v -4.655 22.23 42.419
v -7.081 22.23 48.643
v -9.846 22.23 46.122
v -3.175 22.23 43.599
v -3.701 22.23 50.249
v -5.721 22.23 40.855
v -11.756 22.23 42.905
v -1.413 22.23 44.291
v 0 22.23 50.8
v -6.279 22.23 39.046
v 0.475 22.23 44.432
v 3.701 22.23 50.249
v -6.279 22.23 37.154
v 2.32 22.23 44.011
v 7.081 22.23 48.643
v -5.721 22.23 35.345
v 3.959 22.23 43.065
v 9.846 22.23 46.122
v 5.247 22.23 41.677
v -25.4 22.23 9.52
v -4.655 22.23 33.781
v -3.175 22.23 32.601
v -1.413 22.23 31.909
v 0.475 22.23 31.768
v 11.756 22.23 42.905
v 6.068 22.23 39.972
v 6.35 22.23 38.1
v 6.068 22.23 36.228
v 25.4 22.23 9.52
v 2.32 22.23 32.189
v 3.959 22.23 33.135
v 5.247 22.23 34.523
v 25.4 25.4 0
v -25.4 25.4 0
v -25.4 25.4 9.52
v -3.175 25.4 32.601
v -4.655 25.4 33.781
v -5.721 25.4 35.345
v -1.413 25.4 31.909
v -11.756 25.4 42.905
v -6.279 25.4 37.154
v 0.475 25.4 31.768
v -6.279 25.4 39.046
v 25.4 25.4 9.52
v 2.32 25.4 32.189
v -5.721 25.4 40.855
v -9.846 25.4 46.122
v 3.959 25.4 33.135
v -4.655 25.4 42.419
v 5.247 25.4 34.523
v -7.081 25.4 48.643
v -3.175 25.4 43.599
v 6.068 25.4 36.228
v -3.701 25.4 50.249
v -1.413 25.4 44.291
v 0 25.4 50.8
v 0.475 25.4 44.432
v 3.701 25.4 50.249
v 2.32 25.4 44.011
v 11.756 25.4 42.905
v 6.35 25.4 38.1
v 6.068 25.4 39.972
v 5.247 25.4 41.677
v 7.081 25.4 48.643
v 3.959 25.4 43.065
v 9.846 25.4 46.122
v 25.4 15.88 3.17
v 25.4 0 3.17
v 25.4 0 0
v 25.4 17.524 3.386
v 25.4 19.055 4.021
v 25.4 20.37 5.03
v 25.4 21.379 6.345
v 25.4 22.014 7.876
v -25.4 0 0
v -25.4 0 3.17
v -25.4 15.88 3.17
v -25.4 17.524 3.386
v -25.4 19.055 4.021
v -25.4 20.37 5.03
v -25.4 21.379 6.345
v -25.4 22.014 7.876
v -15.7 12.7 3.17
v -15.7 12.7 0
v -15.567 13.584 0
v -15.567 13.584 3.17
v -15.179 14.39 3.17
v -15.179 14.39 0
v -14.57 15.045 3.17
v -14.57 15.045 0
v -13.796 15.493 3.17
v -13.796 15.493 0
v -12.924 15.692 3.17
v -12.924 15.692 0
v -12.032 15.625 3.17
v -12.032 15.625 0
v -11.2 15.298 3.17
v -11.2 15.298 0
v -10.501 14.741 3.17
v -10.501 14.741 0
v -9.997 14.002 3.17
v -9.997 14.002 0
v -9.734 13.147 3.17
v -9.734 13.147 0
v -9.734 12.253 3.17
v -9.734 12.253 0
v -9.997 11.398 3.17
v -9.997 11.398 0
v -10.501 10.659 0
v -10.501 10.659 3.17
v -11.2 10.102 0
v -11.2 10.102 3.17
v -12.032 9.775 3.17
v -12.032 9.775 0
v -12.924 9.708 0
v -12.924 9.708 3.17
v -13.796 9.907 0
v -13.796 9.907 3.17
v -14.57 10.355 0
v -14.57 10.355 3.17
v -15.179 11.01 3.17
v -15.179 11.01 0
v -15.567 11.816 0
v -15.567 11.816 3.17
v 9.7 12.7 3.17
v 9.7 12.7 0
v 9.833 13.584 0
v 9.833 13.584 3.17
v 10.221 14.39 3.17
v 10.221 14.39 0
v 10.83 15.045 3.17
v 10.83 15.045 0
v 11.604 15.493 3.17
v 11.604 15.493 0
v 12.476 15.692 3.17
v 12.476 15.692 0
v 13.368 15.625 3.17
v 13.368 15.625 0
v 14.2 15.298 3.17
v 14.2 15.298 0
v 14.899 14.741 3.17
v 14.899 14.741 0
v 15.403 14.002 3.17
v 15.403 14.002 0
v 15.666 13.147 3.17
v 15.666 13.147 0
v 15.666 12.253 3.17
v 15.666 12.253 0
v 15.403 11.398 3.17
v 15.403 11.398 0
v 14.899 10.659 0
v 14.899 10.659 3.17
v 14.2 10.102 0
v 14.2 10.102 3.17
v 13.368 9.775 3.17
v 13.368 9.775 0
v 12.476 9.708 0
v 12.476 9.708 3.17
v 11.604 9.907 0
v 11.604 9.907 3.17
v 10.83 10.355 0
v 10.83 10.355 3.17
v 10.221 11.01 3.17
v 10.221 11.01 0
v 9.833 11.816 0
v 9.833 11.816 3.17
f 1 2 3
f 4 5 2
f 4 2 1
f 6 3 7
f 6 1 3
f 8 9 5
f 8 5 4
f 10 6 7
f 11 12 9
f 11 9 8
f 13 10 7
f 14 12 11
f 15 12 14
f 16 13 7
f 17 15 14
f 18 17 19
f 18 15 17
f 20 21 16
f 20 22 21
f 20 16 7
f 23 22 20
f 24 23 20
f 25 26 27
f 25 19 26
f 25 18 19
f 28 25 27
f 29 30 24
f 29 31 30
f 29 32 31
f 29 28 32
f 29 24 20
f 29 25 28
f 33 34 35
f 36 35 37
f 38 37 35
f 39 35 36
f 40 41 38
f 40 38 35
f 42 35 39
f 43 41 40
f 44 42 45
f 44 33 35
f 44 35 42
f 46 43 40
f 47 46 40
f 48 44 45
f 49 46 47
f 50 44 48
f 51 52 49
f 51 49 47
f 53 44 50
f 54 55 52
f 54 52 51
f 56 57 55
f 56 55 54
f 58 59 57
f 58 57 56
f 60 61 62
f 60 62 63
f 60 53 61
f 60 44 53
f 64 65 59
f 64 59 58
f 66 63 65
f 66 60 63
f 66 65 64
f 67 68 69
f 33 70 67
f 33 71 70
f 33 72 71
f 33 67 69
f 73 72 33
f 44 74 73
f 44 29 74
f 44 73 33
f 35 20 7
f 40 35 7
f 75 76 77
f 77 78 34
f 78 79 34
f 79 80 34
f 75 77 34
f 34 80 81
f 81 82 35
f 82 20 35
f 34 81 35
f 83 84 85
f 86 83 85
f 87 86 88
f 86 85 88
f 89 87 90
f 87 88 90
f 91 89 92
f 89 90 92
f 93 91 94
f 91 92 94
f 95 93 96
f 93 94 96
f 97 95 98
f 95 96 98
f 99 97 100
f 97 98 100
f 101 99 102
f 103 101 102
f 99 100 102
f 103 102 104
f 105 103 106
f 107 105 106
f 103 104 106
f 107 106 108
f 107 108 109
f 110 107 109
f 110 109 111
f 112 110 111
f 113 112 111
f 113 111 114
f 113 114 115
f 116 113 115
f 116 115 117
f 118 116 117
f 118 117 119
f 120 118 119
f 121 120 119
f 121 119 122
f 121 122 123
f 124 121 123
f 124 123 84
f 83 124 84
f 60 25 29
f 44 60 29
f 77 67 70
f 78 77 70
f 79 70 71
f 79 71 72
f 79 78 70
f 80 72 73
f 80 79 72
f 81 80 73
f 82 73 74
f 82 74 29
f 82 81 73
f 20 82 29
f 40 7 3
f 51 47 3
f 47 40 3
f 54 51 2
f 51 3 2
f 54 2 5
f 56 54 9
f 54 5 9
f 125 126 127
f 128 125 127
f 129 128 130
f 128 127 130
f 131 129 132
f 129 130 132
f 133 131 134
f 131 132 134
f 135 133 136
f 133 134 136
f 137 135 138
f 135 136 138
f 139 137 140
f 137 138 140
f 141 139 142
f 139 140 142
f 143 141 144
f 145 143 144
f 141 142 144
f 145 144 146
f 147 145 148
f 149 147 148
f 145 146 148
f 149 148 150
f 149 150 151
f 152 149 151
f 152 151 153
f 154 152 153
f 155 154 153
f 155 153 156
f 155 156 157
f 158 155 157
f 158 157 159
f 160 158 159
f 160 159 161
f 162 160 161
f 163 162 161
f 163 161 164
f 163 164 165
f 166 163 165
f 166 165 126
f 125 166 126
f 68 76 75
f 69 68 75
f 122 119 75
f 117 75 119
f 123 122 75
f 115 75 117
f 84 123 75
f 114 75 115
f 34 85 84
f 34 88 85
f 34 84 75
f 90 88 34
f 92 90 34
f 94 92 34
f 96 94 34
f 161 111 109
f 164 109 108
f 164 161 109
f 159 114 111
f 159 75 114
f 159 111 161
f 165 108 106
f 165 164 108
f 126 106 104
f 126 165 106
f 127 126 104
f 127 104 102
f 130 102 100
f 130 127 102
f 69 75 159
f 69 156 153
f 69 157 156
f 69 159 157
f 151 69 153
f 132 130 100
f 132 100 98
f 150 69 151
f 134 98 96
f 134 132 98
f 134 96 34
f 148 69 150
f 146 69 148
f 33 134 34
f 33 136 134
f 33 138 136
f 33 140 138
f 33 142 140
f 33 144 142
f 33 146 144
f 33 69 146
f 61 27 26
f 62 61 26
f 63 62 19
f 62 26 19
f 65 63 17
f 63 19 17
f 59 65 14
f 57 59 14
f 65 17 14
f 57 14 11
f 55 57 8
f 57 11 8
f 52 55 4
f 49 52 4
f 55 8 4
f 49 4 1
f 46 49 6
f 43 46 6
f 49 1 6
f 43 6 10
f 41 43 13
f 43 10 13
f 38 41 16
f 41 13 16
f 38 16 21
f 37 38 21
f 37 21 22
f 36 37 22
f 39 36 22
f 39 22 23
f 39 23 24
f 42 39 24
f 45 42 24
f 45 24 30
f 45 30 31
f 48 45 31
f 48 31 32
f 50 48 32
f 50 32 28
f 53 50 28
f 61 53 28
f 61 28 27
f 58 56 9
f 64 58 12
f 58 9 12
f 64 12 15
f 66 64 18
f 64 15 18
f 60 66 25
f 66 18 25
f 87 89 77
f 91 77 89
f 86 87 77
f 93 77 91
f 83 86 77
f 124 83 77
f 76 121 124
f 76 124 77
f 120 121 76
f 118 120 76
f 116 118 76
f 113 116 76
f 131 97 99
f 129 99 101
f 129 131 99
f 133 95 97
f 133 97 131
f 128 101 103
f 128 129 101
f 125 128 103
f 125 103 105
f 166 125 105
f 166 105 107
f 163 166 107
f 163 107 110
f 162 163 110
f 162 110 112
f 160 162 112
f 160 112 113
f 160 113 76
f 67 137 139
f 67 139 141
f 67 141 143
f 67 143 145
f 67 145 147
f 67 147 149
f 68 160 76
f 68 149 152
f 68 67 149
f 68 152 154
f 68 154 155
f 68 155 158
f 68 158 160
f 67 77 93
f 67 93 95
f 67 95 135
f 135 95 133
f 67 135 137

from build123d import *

# Parameters (mm, degrees)
F1_DEPTH = 25.4
F2_R     = 6.35
F4_D     = 6
F5_R     = 6.35
F6_DEPTH = 3.171


with BuildPart() as f1:
    # F0 (on Right) → F1 (new body, symmetric)
    with BuildSketch(Plane.YZ):
        Polygon((0, 3.17), (0, 0), (25.4, 0), (25.4, 50.8), (22.23, 50.8), (22.23, 3.17), align=None)
    extrude(amount=F1_DEPTH, both=True)

    # F2
    f2_edges = [f1.edges().sort_by_distance(p)[0] for p in [
        (0, 22.23, 3.17),
    ]]
    fillet(f2_edges, radius=F2_R)

    # F4 (through all)
    with Locations(Plane.XY.offset(3.17)):
        with Locations((-12.7, 12.7), (12.7, 12.7)):
            Hole(F4_D / 2)

    # F5 (on face) → F6 (cut, through all)
    with BuildSketch(Plane.XZ.offset(-22.23)):
        with BuildLine():
            Line((-25.4, 9.52), (-11.756103, 42.904585))
            ThreePointArc((-11.756103, 42.904585), (-7.08067, 48.642965), (0, 50.8))
            Line((0, 50.8), (-25.4, 50.8))
            Line((-25.4, 50.8), (-25.4, 9.52))
        make_face()
        with BuildLine():
            ThreePointArc((0, 50.8), (7.08067, 48.642965), (11.756103, 42.904585))
            Line((11.756103, 42.904585), (25.4, 9.52))
            Line((25.4, 9.52), (25.4, 50.8))
            Line((25.4, 50.8), (0, 50.8))
        make_face()
        with Locations((0, 38.1)):
            Circle(F5_R)
    extrude(amount=-F6_DEPTH, mode=Mode.SUBTRACT)


solid = f1.part
